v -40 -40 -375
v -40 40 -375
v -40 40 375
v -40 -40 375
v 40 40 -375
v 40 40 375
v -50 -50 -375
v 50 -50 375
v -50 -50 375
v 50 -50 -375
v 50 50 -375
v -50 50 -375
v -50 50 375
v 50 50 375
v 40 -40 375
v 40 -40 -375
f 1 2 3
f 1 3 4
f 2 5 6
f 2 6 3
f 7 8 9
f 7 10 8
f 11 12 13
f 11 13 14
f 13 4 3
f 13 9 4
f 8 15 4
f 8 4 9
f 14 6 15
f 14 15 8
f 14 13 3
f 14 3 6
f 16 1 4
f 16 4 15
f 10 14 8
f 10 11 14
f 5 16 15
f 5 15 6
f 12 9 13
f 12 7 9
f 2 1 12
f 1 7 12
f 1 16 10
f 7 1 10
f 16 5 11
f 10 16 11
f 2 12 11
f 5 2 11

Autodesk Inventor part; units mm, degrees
sketch "Sketch1" plane through (0, 0, 0) normal (0, 0, 1) x (1, 0, 0)
  line L0 (50, -50) -> (-50, -50)
  line L1 (-50, -50) -> (-50, 50)
  line L2 (-50, 50) -> (50, 50)
  line L3 (50, 50) -> (50, -50)
  line L4 (50, -50) -> (-50, 50) construction
  line L5 (-50, -50) -> (50, 50) construction
  line L6 (-40, 40) -> (-40, -40)
  line L7 (-40, -40) -> (40, -40)
  line L8 (40, -40) -> (40, 40)
  line L9 (40, 40) -> (-40, 40)
  point P0 (0, 0)
  dimension "d0" = 100
  dimension "d1" = 100
  dimension "d2" = 10
extrude "Extrusion1" add sketch "Sketch1" along normal mid plane 750
properties part number "Perna_001_0001" material "Steel"
